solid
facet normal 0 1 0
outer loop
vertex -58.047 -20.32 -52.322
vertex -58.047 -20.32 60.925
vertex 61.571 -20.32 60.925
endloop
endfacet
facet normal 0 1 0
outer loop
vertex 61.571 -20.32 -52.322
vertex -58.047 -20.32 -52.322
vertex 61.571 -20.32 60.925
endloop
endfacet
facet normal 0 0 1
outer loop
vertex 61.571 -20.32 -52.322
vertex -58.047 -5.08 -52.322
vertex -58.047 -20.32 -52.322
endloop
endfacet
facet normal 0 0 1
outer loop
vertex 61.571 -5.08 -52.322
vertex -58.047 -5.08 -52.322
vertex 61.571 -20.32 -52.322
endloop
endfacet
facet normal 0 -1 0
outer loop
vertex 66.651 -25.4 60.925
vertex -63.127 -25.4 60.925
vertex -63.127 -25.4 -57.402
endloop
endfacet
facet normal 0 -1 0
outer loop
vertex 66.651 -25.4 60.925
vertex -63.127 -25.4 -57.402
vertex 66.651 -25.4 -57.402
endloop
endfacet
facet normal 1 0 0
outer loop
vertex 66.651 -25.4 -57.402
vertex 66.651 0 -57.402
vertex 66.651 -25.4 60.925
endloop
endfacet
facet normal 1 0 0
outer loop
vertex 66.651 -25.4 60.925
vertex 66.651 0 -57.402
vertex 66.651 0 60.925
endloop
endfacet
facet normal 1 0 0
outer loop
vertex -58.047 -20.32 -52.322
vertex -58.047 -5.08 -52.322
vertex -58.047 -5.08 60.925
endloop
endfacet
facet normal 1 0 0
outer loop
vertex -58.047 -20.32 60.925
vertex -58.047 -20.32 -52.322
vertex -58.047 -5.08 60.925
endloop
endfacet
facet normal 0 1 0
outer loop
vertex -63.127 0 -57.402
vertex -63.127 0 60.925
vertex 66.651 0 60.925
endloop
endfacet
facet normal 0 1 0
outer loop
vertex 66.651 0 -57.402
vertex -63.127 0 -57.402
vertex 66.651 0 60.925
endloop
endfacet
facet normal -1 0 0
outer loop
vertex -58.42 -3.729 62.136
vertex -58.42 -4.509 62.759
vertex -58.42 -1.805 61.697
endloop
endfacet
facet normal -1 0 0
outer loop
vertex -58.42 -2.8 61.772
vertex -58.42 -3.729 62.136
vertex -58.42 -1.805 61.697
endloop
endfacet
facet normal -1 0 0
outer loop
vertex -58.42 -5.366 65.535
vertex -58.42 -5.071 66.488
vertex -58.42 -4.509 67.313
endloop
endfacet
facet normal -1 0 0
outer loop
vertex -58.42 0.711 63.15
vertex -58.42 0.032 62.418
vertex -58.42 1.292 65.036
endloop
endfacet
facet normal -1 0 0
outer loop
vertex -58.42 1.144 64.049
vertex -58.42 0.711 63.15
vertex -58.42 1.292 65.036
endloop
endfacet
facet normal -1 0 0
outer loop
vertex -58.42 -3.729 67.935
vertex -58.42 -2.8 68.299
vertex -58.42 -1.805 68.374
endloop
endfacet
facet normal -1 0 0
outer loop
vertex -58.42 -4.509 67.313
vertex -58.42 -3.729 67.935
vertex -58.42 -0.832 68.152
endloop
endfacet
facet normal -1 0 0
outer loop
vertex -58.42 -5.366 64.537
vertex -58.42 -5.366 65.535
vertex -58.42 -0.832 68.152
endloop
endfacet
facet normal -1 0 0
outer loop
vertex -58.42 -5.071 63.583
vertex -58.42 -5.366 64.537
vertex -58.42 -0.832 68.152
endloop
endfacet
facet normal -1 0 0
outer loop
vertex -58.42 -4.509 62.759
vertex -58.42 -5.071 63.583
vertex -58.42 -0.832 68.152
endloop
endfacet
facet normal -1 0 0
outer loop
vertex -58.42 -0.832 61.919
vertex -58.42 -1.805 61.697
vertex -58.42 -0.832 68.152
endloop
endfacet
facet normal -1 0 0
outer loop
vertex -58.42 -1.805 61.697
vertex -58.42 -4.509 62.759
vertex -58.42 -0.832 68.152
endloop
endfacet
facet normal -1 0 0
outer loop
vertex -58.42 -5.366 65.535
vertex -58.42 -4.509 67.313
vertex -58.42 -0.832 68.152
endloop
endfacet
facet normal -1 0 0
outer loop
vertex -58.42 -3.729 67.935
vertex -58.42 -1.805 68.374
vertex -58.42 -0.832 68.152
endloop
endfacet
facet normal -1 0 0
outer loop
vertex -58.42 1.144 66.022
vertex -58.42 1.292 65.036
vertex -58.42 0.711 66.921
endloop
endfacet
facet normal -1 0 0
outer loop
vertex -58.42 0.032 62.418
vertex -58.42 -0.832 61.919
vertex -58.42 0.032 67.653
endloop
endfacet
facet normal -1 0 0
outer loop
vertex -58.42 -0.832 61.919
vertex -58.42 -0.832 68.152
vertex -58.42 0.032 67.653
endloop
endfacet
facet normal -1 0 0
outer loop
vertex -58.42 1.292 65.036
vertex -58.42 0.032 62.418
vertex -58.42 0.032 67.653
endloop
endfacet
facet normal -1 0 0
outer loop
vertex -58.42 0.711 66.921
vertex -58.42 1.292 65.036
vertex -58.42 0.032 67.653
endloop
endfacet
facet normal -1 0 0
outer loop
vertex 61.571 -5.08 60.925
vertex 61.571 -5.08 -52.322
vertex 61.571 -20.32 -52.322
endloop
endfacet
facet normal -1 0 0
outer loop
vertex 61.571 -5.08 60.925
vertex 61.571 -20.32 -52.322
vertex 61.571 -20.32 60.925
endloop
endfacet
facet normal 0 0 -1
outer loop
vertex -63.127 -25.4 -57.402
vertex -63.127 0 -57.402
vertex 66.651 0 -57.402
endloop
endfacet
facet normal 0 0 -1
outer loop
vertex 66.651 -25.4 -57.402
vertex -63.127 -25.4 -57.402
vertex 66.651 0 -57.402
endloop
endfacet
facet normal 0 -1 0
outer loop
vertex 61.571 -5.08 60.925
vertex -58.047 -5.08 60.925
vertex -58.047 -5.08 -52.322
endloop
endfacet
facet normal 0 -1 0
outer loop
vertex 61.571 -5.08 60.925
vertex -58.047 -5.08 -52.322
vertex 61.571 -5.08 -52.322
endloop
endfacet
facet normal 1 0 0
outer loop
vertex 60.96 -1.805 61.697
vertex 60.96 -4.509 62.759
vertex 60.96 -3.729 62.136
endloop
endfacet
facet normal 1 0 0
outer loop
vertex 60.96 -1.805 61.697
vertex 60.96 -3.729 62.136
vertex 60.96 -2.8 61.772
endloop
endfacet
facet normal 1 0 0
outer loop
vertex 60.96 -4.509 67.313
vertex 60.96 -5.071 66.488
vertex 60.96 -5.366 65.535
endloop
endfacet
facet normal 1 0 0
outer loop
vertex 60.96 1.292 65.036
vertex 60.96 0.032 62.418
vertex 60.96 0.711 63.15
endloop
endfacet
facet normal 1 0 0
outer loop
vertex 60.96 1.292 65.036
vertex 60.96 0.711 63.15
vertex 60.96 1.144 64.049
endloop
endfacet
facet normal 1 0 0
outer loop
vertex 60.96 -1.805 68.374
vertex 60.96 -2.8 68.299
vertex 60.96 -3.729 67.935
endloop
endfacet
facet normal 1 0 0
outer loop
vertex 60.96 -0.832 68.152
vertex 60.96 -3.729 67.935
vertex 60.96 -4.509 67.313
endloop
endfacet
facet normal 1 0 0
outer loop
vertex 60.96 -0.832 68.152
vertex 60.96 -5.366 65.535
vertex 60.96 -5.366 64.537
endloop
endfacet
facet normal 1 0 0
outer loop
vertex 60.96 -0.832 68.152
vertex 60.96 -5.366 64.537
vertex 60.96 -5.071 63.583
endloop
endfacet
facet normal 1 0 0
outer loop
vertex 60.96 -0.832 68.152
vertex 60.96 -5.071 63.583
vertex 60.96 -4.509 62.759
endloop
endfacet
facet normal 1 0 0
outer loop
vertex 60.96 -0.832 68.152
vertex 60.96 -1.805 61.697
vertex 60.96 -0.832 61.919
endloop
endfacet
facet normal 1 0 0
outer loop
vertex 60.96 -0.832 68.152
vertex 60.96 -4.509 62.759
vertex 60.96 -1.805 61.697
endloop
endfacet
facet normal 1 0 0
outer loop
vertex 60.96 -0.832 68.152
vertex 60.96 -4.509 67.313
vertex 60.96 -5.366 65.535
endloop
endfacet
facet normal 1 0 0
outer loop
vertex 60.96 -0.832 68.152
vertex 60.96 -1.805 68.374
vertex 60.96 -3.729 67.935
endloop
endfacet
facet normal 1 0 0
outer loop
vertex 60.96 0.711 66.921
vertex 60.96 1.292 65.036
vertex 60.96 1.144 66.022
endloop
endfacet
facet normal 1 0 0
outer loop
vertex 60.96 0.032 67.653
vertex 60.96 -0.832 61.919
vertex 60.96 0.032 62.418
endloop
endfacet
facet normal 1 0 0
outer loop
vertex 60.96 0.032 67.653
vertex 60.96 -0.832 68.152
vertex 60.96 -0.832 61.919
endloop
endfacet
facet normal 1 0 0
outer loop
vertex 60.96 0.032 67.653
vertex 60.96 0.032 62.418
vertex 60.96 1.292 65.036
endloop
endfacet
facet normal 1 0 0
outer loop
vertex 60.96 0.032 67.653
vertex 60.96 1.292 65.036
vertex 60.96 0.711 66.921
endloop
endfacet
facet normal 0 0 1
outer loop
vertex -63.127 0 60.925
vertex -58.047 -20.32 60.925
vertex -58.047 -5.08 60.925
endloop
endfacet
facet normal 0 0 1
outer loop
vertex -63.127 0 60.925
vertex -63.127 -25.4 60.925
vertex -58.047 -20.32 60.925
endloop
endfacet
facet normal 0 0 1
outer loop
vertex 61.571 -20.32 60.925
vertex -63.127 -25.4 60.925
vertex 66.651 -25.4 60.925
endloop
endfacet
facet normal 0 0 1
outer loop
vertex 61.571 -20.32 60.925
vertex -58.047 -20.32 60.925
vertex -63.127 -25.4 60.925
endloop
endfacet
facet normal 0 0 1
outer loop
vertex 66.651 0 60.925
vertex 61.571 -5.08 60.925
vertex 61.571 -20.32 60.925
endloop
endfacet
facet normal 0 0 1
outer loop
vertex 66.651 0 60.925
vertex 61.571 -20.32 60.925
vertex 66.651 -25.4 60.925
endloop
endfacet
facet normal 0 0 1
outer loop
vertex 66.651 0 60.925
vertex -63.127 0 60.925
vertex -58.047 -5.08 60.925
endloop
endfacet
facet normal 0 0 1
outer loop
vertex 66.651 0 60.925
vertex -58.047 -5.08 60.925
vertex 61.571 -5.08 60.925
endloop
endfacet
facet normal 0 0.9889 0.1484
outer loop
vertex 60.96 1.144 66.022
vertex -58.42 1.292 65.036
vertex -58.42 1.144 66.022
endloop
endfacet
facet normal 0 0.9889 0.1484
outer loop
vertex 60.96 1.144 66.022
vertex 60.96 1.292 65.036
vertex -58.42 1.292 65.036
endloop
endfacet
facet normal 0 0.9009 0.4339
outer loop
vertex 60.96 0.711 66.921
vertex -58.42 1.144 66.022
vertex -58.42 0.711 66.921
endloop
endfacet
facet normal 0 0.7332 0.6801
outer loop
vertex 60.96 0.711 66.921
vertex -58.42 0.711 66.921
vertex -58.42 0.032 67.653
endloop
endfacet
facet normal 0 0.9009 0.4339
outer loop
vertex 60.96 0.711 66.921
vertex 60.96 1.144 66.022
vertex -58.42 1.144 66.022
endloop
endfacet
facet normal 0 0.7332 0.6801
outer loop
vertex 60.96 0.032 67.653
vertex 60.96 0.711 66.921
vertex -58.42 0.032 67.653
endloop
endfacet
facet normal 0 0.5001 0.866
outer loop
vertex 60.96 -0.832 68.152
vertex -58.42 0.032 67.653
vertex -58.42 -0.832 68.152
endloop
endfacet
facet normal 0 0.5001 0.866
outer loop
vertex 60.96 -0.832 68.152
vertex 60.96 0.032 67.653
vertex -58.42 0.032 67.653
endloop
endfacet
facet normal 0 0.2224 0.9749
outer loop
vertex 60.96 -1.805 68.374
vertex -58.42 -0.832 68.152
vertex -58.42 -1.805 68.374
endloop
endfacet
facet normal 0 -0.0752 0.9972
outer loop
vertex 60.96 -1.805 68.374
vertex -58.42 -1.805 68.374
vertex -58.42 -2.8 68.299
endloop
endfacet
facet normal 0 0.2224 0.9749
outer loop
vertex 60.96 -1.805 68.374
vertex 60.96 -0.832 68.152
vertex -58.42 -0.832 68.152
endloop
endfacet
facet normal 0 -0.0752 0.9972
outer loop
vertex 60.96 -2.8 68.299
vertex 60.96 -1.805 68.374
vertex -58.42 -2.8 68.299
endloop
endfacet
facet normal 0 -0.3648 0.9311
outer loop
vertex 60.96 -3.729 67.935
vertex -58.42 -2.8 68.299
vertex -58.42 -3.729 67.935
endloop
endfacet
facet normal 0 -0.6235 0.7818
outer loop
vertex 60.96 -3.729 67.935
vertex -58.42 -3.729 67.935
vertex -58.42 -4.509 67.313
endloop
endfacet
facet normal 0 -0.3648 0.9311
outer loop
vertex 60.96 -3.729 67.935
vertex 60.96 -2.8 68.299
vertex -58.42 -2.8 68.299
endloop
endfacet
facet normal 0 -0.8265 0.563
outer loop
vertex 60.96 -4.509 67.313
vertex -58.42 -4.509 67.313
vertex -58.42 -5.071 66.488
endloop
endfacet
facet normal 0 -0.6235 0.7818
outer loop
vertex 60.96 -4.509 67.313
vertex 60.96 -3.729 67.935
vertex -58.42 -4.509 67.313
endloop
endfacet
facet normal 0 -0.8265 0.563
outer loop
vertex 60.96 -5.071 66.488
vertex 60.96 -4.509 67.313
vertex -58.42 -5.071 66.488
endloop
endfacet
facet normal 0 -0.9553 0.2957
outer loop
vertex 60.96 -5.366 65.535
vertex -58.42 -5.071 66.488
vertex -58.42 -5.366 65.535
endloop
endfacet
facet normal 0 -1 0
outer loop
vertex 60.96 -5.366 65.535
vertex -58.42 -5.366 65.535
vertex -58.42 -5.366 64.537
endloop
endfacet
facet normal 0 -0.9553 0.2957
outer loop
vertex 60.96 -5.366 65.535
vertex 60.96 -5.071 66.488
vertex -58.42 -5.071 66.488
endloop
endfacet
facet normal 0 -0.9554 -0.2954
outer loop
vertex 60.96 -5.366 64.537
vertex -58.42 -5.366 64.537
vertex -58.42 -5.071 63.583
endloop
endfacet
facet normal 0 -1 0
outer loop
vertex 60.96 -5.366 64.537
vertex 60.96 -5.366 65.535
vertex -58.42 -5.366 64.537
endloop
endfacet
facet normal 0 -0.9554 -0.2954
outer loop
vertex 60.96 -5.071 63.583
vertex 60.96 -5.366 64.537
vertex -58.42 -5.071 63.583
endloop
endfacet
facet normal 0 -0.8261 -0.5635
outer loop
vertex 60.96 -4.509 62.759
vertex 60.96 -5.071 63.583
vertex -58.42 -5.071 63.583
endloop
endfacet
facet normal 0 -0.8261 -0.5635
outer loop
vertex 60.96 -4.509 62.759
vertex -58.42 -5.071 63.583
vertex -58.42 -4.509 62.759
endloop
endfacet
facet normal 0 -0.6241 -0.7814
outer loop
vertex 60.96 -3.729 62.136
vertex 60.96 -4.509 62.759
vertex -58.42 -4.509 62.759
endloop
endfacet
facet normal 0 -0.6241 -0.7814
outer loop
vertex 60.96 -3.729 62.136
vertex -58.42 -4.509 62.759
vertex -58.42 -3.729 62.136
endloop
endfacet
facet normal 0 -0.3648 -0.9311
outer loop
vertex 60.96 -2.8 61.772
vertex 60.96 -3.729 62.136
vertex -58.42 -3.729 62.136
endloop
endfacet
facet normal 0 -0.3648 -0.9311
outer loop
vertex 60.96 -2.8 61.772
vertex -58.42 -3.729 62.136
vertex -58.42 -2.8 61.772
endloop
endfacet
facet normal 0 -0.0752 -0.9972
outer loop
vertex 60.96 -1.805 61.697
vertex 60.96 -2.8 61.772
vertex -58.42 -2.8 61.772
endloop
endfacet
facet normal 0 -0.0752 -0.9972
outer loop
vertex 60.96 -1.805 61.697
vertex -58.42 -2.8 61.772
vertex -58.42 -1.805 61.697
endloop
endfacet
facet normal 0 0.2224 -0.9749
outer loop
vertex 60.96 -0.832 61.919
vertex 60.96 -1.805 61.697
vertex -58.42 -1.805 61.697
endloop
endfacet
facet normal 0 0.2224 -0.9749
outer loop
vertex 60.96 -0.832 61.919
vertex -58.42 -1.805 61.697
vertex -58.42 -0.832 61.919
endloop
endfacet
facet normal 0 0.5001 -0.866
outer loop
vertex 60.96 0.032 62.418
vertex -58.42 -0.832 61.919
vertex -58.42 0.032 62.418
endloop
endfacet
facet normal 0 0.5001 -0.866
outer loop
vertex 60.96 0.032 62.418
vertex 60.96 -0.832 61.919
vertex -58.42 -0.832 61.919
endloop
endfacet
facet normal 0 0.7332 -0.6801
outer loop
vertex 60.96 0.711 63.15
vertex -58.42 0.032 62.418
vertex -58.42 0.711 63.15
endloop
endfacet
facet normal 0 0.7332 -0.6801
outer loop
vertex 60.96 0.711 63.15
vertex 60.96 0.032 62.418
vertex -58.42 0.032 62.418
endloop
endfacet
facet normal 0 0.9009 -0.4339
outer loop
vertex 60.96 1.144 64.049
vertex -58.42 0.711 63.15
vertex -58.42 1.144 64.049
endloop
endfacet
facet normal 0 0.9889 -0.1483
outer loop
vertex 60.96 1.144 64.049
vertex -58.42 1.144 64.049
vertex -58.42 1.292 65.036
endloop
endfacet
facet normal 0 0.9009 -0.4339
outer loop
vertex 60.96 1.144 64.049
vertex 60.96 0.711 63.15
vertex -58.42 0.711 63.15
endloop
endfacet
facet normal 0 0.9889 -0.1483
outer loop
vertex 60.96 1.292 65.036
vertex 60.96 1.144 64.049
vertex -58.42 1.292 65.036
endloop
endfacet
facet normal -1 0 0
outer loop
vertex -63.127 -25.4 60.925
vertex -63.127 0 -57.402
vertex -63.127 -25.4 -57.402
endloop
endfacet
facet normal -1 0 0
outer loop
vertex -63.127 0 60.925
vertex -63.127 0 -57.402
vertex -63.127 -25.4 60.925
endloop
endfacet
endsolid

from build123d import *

# Parameters (mm, degrees)
F0_W          = 129.777685
F0_H          = 118.326712
F1_DEPTH      = 25.4
F2_T          = -5.08
F3_R          = 3.347722
F4_DEPTH      = 60.96
F4_DEPTH_BACK = 58.42


with BuildPart() as f1:
    # F0 (on Front) → F1 (new body)
    with BuildSketch(Plane.XZ):
        with Locations((1.761683, 1.761688)):
            Rectangle(F0_W, F0_H)
    extrude(amount=F1_DEPTH)

    # F2
    f2_openings = [f1.faces().sort_by_distance(p)[0] for p in [
        (1.761682, -12.7, 60.925044),
    ]]
    offset(amount=F2_T, openings=f2_openings)


with BuildPart() as f4:
    # F3 (on Right) → F4 (new body, two sides)
    with BuildSketch(Plane.YZ) as f4_sk:
        with Locations((-2.055303, 65.035652)):
            Circle(F3_R)
    extrude(amount=F4_DEPTH)
    extrude(f4_sk.sketch, amount=-F4_DEPTH_BACK)


solid = Compound([f1.part, f4.part])
